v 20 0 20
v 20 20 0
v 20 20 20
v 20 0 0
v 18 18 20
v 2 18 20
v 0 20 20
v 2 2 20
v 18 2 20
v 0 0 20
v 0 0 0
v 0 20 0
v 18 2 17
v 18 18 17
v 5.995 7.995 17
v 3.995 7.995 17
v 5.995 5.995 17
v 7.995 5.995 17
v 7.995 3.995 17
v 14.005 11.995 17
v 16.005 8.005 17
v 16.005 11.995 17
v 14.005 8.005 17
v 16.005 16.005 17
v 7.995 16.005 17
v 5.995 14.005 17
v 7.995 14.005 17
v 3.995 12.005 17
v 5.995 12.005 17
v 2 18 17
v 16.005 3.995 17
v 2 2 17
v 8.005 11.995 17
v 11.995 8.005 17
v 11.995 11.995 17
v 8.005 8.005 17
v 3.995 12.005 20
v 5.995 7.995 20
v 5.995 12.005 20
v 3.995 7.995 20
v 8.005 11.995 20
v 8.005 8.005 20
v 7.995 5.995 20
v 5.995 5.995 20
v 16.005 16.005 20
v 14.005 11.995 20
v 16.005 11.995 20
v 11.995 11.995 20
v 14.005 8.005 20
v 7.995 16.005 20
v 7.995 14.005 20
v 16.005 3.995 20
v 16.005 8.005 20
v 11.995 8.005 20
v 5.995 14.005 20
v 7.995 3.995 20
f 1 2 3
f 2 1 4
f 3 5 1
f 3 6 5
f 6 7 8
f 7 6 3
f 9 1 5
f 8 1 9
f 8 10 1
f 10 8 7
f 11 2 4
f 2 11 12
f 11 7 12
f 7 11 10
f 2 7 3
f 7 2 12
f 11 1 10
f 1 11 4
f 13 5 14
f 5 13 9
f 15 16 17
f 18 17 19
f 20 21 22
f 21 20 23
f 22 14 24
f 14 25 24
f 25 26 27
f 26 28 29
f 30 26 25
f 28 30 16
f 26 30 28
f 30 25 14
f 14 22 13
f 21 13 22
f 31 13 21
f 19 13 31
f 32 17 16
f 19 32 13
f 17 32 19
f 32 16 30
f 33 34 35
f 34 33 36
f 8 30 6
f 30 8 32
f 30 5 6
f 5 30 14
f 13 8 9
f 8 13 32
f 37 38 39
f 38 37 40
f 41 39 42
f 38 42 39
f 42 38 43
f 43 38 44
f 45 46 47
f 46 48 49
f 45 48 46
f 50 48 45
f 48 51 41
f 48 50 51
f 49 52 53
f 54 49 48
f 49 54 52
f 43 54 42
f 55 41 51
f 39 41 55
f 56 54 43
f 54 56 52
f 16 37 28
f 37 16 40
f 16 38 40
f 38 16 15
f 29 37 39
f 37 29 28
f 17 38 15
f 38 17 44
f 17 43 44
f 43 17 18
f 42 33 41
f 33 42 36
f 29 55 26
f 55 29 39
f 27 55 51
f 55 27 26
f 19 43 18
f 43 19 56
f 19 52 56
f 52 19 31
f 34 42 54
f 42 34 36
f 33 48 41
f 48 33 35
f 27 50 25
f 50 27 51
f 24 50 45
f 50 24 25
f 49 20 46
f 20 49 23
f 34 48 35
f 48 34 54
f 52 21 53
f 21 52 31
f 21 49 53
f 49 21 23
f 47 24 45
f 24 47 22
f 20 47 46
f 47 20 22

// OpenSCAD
/*
Parametric Alphabet Block 
Tony Buser <tbuser@gmail.com>
http://tonybuser.com
http://creativecommons.org/licenses/by/3.0/
*/

include <bitmap.scad>

// change to any letter
letter = "A";

union() {
	difference() {
		cube(size = 20);
		translate(v = [2, 2, 17]) {
			cube(size = [16, 16, 5]);
		}
	}

	translate(v = [10, 10, 15]) {
		8bit_char(letter, 2, 5);
	}
}
